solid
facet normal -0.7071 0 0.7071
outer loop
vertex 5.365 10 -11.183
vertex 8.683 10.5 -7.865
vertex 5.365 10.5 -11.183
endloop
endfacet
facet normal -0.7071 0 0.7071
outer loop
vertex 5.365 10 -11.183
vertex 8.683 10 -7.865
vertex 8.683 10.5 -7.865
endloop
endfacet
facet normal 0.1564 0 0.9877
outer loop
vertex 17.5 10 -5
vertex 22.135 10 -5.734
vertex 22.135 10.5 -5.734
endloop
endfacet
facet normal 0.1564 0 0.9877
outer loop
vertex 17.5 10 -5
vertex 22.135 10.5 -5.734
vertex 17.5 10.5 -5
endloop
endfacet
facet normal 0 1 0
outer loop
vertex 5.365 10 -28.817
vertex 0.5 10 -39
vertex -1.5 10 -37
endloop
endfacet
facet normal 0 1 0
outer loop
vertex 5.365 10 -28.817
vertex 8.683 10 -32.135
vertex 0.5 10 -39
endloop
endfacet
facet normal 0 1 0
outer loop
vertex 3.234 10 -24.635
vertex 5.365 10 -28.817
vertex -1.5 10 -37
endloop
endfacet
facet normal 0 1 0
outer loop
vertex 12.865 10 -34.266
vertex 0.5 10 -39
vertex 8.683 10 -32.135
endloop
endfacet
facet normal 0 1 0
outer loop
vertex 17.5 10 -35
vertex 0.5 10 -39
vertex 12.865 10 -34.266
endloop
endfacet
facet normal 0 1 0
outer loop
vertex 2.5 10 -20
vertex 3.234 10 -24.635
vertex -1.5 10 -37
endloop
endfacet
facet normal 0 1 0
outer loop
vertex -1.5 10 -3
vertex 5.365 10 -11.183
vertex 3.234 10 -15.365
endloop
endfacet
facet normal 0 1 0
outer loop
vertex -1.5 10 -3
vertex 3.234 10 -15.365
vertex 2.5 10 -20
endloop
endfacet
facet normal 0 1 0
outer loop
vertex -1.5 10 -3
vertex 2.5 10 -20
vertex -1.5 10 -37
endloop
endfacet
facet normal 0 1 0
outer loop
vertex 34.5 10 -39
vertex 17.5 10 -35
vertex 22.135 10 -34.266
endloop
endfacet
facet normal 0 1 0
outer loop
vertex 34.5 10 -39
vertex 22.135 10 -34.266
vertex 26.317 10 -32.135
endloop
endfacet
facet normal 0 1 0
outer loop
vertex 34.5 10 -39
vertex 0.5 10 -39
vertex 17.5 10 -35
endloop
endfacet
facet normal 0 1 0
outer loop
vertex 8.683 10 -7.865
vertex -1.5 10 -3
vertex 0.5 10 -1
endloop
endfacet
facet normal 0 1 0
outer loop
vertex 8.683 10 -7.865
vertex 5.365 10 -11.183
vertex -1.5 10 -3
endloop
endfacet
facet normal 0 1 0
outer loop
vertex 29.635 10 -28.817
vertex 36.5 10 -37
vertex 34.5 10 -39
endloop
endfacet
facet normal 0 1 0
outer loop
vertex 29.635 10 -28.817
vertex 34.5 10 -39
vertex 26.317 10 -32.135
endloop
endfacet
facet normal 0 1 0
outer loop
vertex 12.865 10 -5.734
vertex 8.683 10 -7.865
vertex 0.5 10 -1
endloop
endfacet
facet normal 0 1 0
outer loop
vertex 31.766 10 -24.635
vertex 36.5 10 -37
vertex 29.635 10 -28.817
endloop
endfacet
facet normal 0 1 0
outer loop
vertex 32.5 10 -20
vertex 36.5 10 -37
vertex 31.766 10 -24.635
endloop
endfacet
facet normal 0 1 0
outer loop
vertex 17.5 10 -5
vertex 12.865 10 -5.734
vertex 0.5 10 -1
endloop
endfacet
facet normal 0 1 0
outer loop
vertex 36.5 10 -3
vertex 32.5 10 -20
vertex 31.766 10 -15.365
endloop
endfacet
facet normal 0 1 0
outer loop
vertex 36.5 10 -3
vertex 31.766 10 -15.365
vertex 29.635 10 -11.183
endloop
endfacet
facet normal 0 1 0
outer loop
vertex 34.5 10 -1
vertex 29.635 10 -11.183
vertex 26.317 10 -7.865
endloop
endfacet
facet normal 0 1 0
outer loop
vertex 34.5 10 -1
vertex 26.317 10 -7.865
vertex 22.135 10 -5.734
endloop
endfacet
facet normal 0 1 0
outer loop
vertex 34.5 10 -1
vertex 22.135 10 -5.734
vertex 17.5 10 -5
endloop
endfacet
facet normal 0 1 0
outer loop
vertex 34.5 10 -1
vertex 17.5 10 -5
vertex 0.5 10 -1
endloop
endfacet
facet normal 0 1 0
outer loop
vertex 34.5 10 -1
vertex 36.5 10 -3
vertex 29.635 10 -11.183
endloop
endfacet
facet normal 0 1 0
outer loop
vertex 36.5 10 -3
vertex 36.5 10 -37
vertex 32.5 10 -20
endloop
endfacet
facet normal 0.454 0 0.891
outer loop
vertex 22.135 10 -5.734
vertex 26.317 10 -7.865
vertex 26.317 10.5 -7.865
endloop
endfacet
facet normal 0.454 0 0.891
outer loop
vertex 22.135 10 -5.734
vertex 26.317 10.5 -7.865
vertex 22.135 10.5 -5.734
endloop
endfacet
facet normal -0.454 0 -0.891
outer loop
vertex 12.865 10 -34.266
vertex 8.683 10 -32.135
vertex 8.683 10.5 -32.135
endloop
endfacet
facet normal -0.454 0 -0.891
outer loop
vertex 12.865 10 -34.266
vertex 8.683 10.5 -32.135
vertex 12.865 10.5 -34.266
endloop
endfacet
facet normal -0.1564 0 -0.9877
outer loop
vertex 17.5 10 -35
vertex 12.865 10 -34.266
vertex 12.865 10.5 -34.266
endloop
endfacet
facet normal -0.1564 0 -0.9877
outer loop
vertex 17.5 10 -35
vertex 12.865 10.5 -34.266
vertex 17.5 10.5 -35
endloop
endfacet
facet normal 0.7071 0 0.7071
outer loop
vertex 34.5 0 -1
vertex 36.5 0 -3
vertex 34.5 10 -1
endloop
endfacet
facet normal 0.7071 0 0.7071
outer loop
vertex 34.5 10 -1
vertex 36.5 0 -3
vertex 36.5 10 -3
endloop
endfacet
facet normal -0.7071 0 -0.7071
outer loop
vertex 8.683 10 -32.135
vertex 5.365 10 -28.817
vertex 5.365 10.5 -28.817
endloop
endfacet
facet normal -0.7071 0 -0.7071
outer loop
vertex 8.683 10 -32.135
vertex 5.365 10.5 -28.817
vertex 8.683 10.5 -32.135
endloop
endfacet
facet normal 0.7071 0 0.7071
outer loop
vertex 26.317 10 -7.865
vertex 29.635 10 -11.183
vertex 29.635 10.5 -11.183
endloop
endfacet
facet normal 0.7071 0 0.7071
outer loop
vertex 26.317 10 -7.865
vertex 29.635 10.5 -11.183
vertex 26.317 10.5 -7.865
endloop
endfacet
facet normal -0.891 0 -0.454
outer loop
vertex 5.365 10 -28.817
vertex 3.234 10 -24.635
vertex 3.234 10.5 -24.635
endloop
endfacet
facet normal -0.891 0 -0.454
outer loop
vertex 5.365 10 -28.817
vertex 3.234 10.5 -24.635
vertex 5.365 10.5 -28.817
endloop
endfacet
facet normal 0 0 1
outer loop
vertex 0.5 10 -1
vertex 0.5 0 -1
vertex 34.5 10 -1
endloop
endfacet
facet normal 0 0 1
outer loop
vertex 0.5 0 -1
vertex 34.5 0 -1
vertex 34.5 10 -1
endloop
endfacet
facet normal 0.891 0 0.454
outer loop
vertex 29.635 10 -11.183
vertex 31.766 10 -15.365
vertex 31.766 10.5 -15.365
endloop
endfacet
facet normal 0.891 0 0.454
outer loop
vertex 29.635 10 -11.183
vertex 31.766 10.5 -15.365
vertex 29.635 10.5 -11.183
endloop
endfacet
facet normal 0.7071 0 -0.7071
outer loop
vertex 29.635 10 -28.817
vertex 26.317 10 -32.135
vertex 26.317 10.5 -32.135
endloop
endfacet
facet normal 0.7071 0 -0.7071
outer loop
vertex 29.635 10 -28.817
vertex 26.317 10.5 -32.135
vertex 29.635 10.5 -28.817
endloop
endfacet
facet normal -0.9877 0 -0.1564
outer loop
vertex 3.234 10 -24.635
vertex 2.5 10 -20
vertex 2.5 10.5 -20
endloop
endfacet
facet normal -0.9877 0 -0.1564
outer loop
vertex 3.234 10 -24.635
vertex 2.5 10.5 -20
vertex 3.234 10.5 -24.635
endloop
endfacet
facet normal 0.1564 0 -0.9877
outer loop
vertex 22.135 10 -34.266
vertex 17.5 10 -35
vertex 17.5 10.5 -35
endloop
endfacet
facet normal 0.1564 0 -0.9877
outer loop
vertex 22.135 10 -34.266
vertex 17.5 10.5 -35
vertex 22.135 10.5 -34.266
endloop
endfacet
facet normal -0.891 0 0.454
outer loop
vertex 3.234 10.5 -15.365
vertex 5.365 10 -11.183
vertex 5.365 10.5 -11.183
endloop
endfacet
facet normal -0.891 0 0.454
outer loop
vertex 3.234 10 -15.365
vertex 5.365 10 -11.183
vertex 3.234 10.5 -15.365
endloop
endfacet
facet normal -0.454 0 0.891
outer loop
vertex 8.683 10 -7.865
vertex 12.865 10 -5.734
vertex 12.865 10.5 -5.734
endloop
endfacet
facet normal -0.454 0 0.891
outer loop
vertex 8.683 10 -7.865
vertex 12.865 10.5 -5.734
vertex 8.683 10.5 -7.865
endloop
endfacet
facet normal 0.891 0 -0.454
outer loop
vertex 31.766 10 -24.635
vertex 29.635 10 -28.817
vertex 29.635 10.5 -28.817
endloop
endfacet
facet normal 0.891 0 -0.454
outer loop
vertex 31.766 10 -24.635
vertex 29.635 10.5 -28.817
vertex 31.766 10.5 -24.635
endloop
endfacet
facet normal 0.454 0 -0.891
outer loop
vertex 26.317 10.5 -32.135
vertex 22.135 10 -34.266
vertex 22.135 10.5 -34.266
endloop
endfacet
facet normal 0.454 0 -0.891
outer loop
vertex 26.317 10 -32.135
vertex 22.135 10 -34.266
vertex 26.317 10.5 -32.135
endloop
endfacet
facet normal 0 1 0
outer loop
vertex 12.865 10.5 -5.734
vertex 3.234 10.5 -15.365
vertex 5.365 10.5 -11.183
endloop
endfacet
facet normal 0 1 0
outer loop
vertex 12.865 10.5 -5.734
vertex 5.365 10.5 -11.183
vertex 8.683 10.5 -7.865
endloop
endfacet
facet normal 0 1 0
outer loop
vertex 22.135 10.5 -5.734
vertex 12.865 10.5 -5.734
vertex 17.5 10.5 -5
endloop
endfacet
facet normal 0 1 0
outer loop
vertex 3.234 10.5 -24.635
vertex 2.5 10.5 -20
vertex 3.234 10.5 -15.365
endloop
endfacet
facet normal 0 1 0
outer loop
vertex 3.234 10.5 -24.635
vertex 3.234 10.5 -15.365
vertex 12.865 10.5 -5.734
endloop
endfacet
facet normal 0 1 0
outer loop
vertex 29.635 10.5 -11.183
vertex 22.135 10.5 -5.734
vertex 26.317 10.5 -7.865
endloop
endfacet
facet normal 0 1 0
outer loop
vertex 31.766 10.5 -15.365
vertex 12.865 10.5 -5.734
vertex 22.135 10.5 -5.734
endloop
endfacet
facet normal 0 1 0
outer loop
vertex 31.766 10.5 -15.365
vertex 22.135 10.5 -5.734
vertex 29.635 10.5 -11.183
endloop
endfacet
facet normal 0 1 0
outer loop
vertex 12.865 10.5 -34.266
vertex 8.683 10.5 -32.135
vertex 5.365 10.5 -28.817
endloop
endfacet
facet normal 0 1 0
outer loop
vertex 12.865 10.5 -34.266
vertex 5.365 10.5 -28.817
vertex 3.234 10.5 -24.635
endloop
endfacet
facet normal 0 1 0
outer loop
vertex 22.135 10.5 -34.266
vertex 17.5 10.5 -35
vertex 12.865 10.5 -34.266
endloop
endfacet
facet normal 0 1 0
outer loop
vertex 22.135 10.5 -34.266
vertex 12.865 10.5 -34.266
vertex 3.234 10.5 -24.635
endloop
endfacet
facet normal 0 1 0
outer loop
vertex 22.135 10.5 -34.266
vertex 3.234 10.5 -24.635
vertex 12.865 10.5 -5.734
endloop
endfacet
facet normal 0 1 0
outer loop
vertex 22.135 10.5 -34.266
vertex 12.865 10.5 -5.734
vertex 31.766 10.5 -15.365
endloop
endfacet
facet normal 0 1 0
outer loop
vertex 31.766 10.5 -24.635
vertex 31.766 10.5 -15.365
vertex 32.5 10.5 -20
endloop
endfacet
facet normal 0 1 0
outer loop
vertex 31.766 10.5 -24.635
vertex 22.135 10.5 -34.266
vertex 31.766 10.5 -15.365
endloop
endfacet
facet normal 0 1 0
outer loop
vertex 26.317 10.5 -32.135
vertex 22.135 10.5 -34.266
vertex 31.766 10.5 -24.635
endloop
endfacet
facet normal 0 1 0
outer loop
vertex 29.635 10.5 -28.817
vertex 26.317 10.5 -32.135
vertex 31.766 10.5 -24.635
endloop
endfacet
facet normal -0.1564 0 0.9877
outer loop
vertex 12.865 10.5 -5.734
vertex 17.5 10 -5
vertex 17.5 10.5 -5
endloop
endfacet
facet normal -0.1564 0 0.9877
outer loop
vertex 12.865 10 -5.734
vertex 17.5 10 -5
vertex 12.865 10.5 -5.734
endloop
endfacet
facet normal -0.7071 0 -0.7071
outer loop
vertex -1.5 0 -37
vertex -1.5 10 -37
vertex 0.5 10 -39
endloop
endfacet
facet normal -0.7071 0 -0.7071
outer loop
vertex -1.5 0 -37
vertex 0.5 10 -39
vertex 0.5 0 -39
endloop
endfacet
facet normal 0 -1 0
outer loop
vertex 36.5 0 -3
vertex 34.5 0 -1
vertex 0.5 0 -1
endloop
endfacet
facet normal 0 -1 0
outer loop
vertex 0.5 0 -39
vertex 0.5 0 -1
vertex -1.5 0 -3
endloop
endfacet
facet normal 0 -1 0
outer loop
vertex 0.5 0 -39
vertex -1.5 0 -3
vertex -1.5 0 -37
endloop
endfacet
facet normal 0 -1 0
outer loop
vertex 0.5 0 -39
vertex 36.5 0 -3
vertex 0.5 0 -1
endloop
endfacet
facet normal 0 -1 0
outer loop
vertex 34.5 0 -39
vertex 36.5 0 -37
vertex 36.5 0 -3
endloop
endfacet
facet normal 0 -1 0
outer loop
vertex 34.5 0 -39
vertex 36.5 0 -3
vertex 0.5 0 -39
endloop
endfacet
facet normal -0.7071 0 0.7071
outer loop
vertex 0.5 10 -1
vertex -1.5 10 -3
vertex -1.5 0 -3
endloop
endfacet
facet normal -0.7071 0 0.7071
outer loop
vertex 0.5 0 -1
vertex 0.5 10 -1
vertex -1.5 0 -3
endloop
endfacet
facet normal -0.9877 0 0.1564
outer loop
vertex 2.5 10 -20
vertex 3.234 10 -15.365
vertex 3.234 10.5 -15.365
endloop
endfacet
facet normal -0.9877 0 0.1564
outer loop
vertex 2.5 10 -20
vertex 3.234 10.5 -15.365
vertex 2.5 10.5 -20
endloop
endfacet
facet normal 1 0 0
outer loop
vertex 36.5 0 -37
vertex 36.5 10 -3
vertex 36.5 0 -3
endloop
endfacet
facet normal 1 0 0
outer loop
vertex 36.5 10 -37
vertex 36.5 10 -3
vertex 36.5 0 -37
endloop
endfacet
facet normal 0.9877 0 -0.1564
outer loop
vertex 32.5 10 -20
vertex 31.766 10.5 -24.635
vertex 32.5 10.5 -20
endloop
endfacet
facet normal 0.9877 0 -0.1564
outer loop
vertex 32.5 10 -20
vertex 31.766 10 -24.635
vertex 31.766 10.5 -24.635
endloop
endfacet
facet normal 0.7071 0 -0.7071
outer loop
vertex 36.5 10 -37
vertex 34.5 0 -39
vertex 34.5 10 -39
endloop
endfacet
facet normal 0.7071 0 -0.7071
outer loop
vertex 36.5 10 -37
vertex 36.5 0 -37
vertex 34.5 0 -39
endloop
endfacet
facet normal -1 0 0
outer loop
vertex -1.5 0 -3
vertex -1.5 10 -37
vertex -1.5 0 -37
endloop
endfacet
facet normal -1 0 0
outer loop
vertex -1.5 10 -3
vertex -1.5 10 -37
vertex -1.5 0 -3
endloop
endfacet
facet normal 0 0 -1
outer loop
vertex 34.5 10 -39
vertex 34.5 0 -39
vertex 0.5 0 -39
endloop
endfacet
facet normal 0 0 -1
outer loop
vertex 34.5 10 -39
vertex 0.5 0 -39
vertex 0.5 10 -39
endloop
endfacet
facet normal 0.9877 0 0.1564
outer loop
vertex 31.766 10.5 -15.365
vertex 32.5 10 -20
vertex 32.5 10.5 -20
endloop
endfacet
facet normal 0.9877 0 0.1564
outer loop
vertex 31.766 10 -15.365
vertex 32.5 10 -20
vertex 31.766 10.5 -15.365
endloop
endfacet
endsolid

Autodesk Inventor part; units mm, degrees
ref_plane "YZ Plane" through (0, 0, 0) normal (1, 0, 0) x (0, 1, 0)
ref_plane "XZ Plane" through (0, 0, 0) normal (0, 1, 0) x (-1, 0, 0)
ref_plane "XY Plane" through (0, 0, 0) normal (0, 0, 1) x (1, 0, 0)
sketch "草圖1" plane through (0, 0, 0) normal (0, 1, 0) x (-1, 0, 0)
  line L0 (0, 0) -> (-35, 0)
  line L1 (-35, 0) -> (-35, -40)
  line L2 (-35, -40) -> (0, -40)
  line L3 (0, -40) -> (0, 0)
  line L4 (0, -40) -> (0, -39)
  line L5 (0, -39) -> (-35, -39)
  line L6 (-35, -39) -> (-35, -40)
  line L7 (-35, -40) -> (0, -40)
  line L8 (0, 0) -> (0, -1)
  line L9 (0, -1) -> (-35, -1)
  line L10 (-35, -1) -> (-35, 0)
  line L11 (-35, 0) -> (0, 0)
  dimension "d0" = 35
  dimension "d1" = 40
  dimension "d19" = 1
  dimension "d20" = 1
extrude "擠出1" add sketch "草圖1" along normal blind 10 contours L3 L5 L1 L9
sketch "草圖2" plane through (0, 10, 0) normal (0, 1, 0) x (1, 0, 0)
  line L0 (0, 0) -> (0, 20)
  line L1 (0, 20) -> (17.5, 20)
  line L2 (17.5, 20) -> (17.5, 0)
  line L3 (17.5, 0) -> (0, 0)
  line L4 (17.5, 20) -> (2.5, 20)
  line L5 (2.5, 20) -> (3.2342, 24.6353)
  line L6 (3.2342, 24.6353) -> (5.3647, 28.8168)
  line L7 (5.3647, 28.8168) -> (8.6832, 32.1353)
  line L8 (8.6832, 32.1353) -> (12.8647, 34.2658)
  line L9 (12.8647, 34.2658) -> (17.5, 35)
  line L10 (17.5, 35) -> (22.1353, 34.2658)
  line L11 (22.1353, 34.2658) -> (26.3168, 32.1353)
  line L12 (26.3168, 32.1353) -> (29.6353, 28.8168)
  line L13 (29.6353, 28.8168) -> (31.7658, 24.6353)
  line L14 (31.7658, 24.6353) -> (32.5, 20)
  line L15 (32.5, 20) -> (31.7658, 15.3647)
  line L16 (31.7658, 15.3647) -> (29.6353, 11.1832)
  line L17 (29.6353, 11.1832) -> (26.3168, 7.8647)
  line L18 (26.3168, 7.8647) -> (22.1353, 5.7342)
  line L19 (22.1353, 5.7342) -> (17.5, 5)
  line L20 (17.5, 5) -> (12.8647, 5.7342)
  line L21 (12.8647, 5.7342) -> (8.6832, 7.8647)
  line L22 (8.6832, 7.8647) -> (5.3647, 11.1832)
  line L23 (5.3647, 11.1832) -> (3.2342, 15.3647)
  line L24 (3.2342, 15.3647) -> (2.5, 20)
  dimension "d7" = 17.5
  dimension "d8" = 20
  dimension "d9" = 15
extrude "擠出2" add sketch "草圖2" along normal blind 0.5 contours L5 L6 L7 L8 L9 L10 L11 L12 L13 L14 L15 L16 L17 L18 L19 L2 L1 | L1 L2 L20 L21 L22 L23 L24
sketch "草圖3" plane through (35, 0, 0) normal (1, 0, 0) x (0, 0, -1)
  line L0 (40, 0) -> (40, 10) projected
  line L1 (1, 10) -> (39, 10) projected
  line L2 (40, 0) -> (40, 10)
  line L3 (40, 10) -> (0, 10)
  line L4 (0, 10) -> (0, 0)
  line L5 (0, 0) -> (40, 0)
  line L6 (1, 0) -> (1, 10) projected
  line L7 (0, 10) -> (1, 10)
  line L8 (1, 10) -> (1, 0)
  line L9 (1, 0) -> (0, 0)
  line L10 (0, 0) -> (0, 10)
  line L11 (39, 0) -> (39, 10) projected
  line L12 (39, 10) -> (40, 10)
  line L13 (40, 10) -> (40, 0)
  line L14 (40, 0) -> (39, 0)
  line L15 (39, 0) -> (39, 10)
  point P0 (0, 0)
extrude "擠出3" add sketch "草圖3" along normal blind 1.5 contours L5 L6 L1 L11
sketch "草圖4" plane through (0, 0, -40) normal (-1, 0, 0) x (0, 0, 1)
  line L0 (0, 10) -> (40, 10)
  line L1 (40, 10) -> (40, 0)
  line L2 (40, 0) -> (0, 0)
  line L3 (0, 0) -> (0, 10)
  line L4 (1, 0) -> (1, 10) projected
  line L5 (1, 0) -> (1, 10)
  line L6 (39, 0) -> (39, 10) projected
  line L7 (1, 10) -> (39, 10)
  line L8 (39, 10) -> (39, 0)
  line L9 (0, 10) -> (1, 10)
  line L10 (1, 10) -> (1, 0)
  line L11 (1, 0) -> (0, 0)
  line L12 (0, 0) -> (0, 10)
  line L13 (39, 10) -> (40, 10)
  line L14 (40, 10) -> (40, 0)
  line L15 (40, 0) -> (39, 0)
  line L16 (39, 0) -> (39, 10)
extrude "擠出4" add sketch "草圖4" along normal blind 1.5 contours L0 L6 L2 L4
chamfer "倒角3" distance 2 angle 45 4 edges at (36.5, 5, -1) (36.5, 5, -39) (-1.5, 5, -39) (-1.5, 5, -1)
properties part number "樓上跟尖下"
